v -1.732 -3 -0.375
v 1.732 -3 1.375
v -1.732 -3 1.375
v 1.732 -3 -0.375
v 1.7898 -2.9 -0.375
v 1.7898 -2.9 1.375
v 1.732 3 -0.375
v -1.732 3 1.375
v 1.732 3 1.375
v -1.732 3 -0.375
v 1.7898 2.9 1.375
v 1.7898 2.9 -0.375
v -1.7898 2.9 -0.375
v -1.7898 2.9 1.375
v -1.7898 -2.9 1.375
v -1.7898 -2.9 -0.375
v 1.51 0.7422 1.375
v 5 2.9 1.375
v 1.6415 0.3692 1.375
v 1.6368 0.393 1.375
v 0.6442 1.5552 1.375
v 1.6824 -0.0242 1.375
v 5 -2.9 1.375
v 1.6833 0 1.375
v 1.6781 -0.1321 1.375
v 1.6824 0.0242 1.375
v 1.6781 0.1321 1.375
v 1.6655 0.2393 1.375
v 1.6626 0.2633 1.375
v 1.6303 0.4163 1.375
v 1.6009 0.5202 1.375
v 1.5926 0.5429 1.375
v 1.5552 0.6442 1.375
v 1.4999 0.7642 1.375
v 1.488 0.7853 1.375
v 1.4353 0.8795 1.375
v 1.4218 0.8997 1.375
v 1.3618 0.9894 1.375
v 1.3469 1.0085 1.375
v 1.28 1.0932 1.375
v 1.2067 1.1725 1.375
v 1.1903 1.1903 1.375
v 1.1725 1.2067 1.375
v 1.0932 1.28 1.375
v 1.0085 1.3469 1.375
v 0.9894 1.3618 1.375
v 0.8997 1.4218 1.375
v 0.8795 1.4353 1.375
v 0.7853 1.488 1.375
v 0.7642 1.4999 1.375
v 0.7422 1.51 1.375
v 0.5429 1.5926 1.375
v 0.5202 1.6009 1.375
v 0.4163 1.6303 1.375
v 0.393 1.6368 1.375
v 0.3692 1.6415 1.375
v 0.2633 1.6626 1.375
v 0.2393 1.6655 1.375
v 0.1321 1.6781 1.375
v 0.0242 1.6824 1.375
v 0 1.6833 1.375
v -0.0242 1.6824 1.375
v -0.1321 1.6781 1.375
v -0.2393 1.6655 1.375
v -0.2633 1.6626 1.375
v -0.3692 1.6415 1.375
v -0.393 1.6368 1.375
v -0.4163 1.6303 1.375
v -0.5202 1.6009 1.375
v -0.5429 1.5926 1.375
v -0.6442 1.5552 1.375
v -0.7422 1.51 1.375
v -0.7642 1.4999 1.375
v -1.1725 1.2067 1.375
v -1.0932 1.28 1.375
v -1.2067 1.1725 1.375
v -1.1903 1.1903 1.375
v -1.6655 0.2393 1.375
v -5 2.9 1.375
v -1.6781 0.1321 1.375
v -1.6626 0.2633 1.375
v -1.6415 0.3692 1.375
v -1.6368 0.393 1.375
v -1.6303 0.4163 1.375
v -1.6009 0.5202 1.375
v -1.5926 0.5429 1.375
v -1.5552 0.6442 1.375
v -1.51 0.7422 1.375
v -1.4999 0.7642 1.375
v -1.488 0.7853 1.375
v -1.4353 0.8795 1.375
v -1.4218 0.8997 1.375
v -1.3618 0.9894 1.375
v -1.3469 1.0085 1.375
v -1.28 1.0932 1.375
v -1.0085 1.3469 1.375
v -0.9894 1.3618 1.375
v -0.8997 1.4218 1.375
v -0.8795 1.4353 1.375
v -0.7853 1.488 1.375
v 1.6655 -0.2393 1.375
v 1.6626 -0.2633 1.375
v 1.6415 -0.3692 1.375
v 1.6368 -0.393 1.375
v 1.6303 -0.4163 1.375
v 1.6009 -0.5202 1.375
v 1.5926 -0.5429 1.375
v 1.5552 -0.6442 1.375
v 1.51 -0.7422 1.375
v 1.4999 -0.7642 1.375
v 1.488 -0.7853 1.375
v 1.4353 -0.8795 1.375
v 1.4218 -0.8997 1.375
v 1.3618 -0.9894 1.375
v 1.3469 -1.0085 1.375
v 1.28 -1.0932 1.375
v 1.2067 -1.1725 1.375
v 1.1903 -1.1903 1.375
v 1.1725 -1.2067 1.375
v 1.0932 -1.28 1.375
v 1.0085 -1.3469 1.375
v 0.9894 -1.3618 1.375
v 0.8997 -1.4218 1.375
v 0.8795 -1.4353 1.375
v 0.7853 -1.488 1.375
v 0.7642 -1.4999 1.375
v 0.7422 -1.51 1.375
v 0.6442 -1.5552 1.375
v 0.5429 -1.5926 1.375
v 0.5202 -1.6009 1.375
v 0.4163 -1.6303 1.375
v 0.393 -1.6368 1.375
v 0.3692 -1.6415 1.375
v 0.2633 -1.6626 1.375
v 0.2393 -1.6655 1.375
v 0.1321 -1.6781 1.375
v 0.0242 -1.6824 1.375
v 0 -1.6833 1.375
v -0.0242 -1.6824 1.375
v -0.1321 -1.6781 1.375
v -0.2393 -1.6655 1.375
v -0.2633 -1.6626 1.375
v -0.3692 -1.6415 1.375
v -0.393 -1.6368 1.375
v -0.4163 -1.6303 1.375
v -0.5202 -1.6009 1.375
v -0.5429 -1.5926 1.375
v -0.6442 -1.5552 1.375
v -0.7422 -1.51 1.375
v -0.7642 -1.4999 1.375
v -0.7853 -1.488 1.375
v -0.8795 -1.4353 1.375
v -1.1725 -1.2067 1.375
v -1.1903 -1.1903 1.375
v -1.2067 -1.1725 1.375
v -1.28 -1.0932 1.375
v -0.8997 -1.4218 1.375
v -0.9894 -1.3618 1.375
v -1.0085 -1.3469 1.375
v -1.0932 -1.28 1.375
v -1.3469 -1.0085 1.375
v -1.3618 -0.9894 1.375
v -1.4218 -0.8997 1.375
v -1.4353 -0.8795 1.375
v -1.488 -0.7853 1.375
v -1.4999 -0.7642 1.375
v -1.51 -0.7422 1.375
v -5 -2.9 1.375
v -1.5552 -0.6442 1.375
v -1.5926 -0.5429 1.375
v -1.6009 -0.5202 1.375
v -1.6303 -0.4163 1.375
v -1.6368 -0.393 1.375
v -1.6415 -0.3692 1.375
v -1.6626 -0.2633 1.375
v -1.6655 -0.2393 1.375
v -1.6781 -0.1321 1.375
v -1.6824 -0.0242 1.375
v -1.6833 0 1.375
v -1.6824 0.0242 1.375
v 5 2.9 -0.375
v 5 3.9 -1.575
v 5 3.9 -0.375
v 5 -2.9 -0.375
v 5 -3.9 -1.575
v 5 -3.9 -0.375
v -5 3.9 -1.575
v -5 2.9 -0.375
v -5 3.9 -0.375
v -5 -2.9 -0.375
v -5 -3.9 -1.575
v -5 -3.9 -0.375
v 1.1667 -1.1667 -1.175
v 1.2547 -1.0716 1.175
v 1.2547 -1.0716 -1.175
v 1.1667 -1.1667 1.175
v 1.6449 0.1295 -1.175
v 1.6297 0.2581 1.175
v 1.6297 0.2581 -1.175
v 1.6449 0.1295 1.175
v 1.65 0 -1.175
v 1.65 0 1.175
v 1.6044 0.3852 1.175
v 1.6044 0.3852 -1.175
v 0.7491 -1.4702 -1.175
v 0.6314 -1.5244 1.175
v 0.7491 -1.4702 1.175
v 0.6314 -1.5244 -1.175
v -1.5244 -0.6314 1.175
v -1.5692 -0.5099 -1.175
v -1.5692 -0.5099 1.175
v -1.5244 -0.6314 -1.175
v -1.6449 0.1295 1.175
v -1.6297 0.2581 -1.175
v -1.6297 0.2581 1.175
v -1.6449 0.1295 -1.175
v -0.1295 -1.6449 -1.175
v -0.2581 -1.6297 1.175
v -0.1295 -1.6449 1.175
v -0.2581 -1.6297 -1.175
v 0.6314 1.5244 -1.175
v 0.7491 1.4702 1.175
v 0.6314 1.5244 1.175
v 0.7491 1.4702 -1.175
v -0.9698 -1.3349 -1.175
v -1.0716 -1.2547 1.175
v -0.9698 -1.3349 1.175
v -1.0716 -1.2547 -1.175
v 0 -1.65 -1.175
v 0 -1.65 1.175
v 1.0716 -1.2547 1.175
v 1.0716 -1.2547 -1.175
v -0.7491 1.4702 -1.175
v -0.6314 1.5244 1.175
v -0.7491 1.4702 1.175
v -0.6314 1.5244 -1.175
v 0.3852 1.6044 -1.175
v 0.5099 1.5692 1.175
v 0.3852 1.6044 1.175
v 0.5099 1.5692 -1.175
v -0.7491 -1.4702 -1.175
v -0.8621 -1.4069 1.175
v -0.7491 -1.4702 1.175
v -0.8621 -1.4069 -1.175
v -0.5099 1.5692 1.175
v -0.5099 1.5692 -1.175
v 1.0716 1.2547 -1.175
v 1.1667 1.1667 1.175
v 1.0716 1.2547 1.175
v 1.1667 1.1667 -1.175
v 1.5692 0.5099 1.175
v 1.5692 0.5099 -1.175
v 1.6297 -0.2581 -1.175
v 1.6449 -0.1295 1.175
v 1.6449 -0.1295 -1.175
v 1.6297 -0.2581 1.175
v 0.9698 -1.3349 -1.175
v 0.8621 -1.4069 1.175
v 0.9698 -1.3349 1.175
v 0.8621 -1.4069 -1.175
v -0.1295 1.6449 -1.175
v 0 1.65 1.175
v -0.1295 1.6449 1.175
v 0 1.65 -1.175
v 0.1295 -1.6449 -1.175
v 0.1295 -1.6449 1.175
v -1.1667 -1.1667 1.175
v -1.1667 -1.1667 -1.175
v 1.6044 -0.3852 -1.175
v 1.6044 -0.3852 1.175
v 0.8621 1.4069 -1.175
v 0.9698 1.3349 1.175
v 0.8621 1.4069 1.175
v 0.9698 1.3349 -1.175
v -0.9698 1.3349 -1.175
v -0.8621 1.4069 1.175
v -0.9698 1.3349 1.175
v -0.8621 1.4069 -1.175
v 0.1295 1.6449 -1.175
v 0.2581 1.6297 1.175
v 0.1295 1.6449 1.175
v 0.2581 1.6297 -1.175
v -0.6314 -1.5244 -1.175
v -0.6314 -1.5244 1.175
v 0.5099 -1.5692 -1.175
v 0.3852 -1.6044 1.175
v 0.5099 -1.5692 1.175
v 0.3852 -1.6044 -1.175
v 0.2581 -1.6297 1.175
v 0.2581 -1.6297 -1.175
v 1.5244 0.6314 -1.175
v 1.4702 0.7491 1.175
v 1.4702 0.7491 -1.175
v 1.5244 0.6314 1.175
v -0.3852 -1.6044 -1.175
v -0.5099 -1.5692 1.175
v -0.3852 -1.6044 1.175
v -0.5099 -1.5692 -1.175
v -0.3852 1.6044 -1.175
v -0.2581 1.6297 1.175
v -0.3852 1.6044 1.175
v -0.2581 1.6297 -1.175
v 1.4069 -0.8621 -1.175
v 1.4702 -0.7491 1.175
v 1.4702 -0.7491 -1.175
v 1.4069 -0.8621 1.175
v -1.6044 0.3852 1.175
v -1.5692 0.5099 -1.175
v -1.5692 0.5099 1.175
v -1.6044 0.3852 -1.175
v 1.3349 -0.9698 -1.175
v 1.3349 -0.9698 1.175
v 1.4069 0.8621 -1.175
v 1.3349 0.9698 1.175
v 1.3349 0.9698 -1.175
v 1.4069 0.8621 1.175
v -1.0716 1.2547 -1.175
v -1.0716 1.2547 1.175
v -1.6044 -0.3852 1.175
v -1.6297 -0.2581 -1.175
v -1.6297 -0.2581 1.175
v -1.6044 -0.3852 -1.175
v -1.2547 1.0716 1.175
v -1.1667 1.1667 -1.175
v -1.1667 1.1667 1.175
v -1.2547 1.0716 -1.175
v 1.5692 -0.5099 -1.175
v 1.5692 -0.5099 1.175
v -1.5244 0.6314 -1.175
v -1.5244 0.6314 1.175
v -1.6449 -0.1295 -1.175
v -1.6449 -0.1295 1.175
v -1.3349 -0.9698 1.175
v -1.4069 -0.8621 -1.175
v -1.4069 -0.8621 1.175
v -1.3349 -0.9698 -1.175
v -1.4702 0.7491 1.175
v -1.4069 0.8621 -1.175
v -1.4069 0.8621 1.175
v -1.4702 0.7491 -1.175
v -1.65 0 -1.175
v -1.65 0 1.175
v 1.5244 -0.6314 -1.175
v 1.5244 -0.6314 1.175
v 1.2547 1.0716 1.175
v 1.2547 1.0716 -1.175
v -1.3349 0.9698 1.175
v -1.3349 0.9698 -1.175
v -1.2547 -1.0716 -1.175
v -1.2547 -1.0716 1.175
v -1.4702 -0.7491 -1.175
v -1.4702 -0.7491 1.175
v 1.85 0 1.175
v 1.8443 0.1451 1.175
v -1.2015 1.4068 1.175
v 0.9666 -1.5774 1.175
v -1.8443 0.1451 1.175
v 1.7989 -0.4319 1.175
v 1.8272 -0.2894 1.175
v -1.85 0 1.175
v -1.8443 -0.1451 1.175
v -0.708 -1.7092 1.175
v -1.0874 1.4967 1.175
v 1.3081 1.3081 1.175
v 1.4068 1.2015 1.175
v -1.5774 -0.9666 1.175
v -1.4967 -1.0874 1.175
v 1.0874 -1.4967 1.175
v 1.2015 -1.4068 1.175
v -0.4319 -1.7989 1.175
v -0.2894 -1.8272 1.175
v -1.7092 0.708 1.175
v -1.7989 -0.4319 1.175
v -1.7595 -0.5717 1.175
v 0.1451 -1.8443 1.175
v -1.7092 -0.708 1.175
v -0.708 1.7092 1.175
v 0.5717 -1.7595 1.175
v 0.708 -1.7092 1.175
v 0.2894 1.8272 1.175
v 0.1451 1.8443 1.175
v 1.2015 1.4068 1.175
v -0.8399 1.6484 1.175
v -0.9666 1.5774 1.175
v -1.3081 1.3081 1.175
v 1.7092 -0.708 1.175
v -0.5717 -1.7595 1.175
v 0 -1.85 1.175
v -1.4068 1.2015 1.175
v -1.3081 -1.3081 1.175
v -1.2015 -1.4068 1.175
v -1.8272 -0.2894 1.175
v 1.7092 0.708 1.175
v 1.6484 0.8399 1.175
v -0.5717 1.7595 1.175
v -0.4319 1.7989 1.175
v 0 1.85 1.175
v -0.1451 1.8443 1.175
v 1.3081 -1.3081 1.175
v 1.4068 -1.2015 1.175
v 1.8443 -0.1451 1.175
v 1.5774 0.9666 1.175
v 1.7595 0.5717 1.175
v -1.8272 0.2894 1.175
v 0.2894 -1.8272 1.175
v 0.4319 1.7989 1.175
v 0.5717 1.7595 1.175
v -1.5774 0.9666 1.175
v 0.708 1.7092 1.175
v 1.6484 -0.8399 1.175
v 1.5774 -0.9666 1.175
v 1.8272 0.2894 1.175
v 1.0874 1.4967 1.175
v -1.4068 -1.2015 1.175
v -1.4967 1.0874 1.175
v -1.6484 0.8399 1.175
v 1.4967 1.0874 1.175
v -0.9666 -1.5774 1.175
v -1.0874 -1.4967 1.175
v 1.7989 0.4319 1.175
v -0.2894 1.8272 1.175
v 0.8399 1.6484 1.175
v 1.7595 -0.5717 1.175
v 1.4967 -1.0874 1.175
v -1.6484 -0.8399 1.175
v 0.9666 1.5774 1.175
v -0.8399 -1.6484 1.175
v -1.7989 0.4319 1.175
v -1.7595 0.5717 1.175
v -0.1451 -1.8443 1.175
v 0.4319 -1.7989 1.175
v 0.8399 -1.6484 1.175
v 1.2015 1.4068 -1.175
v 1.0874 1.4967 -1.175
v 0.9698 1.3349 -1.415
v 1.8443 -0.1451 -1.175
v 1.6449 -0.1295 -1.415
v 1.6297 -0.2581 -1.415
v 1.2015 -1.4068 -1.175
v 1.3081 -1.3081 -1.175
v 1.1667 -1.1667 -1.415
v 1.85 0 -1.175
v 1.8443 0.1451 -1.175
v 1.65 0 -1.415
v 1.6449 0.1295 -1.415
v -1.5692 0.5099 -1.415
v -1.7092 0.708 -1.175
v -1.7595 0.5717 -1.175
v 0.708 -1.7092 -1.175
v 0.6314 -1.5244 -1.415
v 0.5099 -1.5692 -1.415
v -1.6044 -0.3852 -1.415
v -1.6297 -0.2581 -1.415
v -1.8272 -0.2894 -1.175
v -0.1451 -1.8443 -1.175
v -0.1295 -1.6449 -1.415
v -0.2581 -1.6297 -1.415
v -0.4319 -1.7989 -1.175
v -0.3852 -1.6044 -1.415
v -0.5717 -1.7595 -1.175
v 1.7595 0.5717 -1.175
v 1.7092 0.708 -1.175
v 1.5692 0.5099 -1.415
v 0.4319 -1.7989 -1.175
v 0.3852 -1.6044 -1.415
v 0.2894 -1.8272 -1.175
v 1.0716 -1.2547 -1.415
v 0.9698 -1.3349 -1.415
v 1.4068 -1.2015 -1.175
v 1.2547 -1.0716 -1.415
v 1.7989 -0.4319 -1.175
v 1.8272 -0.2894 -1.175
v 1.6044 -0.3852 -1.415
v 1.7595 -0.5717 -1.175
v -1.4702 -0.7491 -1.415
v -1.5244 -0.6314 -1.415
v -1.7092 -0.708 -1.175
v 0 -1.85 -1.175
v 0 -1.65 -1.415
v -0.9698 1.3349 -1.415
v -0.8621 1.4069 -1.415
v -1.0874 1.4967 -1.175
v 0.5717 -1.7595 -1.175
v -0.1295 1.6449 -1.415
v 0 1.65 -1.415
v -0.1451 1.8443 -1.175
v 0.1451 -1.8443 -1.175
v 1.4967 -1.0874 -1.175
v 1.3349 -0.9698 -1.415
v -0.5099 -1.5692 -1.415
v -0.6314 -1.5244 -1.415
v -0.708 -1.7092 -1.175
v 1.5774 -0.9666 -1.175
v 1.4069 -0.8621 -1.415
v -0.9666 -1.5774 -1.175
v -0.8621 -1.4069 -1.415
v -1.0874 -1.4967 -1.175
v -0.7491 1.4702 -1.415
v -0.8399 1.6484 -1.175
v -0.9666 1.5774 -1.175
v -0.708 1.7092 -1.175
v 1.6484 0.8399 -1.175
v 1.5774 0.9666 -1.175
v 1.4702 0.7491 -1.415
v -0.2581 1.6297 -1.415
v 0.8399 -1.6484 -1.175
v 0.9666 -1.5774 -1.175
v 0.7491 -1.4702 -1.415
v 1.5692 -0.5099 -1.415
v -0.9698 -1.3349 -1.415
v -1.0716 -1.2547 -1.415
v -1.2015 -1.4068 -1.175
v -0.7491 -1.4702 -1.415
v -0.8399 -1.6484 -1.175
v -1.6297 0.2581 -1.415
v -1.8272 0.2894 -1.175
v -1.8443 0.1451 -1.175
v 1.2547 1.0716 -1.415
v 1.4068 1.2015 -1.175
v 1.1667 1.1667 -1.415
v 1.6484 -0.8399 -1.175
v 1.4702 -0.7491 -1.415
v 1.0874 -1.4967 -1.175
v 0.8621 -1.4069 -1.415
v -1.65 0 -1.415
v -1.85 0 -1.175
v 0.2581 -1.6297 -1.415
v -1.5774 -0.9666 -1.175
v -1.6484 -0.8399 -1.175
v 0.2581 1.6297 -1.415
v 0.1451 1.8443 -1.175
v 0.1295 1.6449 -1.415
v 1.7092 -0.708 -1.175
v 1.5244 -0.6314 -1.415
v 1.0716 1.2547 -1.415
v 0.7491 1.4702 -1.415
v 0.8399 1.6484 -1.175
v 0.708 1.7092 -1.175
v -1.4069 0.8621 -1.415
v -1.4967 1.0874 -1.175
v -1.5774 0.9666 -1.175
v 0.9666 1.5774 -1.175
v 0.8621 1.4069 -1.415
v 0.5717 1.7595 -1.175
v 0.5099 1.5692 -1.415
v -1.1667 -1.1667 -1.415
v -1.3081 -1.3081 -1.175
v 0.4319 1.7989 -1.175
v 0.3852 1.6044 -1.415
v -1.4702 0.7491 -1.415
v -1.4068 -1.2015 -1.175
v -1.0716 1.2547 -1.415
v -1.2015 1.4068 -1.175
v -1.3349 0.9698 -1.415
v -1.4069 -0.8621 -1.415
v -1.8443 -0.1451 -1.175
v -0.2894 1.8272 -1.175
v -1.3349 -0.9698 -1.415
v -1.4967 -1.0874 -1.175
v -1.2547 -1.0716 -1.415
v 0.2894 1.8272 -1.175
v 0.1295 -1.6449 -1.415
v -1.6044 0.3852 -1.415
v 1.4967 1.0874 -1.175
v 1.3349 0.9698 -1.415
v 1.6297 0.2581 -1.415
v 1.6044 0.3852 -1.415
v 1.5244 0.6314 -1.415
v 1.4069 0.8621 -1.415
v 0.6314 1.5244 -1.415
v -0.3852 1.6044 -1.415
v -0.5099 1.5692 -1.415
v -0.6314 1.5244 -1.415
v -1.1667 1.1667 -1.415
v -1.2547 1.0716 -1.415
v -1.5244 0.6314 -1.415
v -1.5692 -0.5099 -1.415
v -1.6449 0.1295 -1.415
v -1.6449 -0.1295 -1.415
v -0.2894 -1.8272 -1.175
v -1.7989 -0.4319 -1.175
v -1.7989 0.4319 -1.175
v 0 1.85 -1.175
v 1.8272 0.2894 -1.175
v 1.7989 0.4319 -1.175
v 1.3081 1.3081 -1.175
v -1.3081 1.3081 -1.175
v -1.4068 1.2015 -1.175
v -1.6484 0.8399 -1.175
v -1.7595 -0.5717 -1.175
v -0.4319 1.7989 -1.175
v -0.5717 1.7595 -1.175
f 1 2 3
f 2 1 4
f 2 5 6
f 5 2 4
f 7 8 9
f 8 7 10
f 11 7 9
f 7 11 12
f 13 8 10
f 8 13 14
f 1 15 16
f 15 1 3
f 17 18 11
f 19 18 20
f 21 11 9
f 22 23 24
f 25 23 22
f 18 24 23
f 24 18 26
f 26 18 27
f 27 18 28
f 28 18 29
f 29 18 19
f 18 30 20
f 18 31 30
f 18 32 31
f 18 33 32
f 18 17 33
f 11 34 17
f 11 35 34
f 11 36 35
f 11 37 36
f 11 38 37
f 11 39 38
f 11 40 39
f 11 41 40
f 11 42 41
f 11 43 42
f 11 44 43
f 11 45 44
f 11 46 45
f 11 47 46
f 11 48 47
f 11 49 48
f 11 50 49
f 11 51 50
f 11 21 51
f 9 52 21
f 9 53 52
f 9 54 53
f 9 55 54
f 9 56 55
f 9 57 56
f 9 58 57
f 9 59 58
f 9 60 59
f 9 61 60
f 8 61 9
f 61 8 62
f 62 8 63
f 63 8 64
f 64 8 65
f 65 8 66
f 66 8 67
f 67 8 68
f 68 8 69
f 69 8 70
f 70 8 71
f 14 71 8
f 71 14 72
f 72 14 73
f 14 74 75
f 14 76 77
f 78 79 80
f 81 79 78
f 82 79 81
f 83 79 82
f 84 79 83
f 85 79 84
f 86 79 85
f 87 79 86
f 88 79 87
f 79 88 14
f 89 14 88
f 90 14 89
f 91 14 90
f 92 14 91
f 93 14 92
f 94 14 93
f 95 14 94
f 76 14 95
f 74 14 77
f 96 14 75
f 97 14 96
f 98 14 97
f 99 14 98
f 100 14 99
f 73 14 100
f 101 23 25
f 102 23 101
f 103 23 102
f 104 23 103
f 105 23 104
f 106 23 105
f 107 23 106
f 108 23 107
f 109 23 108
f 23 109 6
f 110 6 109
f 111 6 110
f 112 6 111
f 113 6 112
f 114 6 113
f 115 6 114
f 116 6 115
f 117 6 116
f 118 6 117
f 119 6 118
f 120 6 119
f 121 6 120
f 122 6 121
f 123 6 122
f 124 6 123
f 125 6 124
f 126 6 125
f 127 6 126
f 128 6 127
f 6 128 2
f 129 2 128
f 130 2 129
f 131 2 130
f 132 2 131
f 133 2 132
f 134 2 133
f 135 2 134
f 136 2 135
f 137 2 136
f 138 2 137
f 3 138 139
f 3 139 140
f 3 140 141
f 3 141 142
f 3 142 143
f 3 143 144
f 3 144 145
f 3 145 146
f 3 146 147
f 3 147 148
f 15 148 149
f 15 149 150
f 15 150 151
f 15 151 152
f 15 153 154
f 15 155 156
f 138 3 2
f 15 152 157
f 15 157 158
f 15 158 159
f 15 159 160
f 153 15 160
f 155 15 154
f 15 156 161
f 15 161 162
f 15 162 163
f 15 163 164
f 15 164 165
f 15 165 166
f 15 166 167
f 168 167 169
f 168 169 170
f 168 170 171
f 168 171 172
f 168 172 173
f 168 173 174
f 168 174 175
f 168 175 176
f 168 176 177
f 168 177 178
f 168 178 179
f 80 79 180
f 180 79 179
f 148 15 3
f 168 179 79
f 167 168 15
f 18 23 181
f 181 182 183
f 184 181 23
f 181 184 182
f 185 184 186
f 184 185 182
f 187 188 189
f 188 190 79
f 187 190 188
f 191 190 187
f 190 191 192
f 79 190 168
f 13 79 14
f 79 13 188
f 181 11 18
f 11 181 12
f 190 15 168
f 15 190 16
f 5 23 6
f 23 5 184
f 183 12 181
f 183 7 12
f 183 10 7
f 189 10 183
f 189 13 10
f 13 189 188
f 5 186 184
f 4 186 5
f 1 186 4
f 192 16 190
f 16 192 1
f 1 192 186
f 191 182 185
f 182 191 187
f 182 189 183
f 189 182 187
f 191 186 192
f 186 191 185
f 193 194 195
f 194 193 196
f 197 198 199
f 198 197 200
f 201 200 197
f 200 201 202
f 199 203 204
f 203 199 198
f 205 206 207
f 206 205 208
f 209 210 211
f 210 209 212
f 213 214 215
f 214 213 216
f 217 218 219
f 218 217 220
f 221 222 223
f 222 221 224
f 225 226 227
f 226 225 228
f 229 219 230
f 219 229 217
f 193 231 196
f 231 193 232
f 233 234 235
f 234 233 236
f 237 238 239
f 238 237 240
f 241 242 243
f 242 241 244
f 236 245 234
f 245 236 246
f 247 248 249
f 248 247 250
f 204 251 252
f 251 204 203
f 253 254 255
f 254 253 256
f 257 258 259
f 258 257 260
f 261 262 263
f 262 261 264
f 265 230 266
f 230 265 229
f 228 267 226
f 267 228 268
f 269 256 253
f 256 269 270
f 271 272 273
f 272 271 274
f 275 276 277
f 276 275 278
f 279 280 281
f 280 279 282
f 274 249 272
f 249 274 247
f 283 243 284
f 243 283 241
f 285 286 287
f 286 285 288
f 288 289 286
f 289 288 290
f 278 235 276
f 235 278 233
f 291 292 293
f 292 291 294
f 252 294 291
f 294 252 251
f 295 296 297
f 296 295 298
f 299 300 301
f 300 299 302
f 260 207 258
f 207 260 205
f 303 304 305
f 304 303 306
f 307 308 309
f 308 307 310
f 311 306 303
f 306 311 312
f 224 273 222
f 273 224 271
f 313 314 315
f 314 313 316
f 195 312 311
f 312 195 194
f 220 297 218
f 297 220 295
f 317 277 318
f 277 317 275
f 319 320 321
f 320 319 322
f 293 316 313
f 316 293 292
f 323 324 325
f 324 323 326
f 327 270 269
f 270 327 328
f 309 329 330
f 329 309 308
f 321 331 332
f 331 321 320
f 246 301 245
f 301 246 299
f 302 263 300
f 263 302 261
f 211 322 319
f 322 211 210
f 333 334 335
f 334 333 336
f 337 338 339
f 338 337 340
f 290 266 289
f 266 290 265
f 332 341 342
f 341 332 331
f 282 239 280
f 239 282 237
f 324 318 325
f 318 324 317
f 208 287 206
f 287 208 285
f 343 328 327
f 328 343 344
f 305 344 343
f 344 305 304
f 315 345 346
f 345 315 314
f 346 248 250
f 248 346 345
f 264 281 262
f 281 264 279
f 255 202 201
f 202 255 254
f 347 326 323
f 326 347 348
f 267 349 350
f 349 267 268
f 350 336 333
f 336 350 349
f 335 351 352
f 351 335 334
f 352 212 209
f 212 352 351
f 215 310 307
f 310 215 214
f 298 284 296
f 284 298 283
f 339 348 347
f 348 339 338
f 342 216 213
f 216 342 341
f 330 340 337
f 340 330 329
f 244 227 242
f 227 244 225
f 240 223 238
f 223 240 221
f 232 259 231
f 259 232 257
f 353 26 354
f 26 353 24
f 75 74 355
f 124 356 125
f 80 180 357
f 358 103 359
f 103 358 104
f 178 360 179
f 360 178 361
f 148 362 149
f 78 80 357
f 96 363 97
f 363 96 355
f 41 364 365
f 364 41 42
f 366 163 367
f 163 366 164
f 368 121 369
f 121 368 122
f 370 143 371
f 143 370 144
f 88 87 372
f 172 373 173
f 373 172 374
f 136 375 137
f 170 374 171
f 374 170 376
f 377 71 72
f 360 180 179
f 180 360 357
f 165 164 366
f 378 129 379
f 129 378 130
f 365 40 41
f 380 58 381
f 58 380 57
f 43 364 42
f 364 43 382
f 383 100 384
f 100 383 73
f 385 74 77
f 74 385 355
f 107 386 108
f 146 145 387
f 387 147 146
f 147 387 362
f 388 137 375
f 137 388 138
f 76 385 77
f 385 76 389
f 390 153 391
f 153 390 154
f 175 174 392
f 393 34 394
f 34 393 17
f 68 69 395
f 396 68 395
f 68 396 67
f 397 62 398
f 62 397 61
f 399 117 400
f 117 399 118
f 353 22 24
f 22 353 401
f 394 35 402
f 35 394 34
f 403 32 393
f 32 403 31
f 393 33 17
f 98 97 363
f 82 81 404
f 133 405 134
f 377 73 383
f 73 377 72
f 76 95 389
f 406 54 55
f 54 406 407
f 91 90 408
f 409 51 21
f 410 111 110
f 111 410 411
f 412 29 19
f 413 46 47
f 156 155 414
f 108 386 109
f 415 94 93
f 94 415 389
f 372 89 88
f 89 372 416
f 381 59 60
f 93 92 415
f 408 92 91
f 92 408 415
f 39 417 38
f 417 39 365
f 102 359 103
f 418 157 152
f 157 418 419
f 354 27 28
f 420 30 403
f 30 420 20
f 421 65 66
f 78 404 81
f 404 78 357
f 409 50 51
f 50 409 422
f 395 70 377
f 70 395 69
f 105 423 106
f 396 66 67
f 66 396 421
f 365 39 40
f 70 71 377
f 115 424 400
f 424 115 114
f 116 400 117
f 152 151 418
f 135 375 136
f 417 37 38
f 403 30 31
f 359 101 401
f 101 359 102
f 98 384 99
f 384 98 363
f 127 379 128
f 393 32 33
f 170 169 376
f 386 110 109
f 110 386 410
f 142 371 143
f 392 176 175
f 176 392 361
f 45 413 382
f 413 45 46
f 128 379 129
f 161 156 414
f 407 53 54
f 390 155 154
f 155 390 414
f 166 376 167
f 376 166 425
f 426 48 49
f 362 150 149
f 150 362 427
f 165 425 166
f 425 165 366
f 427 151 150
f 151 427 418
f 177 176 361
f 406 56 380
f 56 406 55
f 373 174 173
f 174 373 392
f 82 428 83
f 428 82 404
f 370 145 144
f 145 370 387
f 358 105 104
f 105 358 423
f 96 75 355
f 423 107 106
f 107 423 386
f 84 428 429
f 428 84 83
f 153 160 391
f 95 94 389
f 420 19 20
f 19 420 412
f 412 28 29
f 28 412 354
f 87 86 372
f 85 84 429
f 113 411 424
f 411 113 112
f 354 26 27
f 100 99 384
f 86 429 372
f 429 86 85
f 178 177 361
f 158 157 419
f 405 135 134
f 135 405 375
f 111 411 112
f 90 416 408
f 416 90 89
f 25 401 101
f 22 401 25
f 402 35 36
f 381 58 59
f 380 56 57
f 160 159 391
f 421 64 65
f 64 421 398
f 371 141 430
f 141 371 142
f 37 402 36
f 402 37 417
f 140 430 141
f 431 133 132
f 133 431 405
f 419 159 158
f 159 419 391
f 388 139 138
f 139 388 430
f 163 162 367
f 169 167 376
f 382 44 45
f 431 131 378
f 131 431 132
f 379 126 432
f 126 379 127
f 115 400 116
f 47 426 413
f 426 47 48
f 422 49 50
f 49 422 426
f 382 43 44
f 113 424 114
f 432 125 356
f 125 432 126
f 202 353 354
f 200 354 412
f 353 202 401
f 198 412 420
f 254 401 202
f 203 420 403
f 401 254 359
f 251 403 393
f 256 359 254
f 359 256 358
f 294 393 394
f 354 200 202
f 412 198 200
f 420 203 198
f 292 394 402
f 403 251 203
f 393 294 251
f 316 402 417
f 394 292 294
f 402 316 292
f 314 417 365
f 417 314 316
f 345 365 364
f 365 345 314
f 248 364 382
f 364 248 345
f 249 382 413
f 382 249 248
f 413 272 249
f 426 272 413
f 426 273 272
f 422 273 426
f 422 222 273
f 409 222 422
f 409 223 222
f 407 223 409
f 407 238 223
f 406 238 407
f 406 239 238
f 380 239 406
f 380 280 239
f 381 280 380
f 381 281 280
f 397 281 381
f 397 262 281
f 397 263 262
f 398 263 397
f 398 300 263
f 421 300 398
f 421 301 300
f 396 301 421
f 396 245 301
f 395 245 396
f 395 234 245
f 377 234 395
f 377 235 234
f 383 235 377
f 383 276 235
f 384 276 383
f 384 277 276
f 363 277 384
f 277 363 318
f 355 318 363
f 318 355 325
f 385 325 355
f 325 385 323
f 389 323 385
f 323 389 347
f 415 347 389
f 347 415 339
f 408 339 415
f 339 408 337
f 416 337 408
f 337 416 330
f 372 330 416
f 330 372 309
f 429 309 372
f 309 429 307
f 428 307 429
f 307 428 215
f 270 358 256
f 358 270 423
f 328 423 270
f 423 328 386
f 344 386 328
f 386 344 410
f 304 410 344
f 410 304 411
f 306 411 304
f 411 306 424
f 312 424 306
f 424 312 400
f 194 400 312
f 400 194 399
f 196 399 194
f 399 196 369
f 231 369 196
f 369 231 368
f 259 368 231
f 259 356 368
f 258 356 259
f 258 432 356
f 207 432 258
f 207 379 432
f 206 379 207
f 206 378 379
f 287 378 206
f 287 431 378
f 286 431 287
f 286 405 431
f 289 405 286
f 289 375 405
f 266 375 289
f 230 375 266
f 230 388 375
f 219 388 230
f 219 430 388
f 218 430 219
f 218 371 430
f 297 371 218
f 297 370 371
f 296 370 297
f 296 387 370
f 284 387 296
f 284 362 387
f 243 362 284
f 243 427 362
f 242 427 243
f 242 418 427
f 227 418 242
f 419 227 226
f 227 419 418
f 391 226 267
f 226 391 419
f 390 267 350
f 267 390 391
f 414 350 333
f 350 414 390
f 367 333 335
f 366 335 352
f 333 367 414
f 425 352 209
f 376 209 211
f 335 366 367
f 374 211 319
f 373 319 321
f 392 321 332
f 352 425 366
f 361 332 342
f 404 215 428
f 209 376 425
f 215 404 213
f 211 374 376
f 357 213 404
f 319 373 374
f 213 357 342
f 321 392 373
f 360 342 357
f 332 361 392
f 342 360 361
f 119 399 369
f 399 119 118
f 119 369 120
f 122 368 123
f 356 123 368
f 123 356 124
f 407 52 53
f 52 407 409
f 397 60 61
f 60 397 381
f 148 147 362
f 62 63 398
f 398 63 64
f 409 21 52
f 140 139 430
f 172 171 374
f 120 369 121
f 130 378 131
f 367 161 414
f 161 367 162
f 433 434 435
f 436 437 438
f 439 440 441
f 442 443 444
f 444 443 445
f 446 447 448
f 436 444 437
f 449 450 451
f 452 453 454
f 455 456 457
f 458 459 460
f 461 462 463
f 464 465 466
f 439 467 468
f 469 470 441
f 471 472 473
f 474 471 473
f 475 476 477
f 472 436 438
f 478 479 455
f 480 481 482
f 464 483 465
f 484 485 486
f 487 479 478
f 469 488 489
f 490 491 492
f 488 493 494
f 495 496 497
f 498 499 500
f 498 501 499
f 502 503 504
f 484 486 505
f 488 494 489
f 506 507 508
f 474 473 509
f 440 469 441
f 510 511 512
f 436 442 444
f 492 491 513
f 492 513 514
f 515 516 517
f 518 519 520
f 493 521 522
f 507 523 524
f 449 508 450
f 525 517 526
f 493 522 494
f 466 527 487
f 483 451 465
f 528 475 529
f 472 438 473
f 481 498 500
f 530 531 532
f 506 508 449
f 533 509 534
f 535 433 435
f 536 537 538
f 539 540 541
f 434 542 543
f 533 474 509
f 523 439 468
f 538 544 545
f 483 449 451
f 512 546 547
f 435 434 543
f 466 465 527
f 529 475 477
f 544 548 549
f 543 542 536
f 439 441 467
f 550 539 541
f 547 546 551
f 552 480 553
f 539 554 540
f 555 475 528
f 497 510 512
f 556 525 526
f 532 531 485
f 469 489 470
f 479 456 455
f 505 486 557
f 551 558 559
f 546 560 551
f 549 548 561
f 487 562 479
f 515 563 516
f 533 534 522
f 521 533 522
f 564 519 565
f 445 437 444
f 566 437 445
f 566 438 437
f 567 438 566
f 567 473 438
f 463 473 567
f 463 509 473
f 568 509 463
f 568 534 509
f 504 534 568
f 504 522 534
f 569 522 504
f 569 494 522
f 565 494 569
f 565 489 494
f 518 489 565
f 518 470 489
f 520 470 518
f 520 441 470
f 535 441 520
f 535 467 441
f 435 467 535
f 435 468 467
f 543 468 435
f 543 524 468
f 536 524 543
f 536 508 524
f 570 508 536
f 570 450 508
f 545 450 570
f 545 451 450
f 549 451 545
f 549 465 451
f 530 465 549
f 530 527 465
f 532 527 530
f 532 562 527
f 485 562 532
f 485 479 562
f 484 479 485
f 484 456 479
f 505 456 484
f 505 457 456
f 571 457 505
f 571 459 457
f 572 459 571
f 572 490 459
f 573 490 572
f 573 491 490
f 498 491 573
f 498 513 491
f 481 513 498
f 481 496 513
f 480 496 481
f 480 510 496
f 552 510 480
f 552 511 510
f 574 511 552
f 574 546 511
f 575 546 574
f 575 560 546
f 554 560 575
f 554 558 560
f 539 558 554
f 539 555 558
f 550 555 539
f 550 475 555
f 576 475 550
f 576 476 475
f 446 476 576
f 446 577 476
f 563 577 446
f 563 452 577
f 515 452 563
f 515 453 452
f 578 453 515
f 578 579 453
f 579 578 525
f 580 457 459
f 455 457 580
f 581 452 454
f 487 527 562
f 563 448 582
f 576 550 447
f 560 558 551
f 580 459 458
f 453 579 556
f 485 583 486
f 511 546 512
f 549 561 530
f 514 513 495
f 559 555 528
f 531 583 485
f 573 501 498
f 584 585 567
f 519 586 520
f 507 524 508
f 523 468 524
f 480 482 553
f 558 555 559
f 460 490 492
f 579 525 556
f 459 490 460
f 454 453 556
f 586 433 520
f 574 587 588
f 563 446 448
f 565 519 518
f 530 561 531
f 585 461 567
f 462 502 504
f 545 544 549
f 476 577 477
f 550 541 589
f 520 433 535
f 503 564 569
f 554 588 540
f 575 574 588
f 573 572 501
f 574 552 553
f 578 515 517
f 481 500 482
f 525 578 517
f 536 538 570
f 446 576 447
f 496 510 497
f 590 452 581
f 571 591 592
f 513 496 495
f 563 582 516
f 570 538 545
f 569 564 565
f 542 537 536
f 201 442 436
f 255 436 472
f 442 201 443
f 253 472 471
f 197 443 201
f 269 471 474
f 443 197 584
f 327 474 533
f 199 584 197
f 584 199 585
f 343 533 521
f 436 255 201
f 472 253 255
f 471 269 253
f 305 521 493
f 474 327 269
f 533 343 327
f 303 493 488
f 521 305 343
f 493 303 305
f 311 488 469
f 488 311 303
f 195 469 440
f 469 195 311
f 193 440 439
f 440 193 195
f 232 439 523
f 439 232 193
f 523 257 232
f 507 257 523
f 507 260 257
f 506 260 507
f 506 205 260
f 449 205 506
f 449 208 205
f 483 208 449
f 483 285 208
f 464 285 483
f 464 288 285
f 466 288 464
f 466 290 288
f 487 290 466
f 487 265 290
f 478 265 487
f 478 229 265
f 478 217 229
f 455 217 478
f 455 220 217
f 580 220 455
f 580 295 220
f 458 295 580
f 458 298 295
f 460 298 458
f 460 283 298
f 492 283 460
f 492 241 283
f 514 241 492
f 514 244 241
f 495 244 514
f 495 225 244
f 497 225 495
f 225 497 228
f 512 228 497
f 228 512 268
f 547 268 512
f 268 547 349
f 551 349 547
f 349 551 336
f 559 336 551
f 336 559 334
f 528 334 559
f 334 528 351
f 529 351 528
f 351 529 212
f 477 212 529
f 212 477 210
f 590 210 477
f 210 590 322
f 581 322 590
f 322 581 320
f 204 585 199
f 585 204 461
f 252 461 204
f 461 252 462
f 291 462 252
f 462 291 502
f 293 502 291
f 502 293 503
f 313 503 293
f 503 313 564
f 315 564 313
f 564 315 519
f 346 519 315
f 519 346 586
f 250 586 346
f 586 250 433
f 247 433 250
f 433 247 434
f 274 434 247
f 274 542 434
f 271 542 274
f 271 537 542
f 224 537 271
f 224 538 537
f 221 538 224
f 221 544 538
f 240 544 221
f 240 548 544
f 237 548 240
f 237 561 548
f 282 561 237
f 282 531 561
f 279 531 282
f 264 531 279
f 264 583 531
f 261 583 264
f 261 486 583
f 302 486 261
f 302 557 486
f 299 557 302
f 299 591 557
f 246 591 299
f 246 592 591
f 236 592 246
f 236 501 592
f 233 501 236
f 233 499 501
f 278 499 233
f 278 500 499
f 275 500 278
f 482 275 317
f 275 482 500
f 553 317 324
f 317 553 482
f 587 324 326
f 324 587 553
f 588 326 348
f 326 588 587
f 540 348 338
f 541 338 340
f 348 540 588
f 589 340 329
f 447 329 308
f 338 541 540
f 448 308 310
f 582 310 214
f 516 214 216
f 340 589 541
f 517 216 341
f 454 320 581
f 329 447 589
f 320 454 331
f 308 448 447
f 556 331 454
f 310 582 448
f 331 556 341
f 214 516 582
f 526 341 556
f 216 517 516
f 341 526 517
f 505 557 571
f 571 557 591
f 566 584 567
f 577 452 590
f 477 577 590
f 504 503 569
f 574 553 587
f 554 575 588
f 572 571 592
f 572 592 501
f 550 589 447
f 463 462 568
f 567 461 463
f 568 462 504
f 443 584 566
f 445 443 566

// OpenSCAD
// T-slot nut for M3 screw, 6.0mm across flats, 2.75mm thick
// One connected solid (nut body only), with a centered M3 clearance hole.

$fn = 80;

// Parameters (mm)
screw_diameter_mm        = 3.0;
hole_clearance_mm        = 0.30;   // clearance for M3
outer_across_flats_mm    = 6.0;    // hex across flats
thickness_mm             = 2.75;   // overall thickness
chamfer_mm               = 0.20;   // small lead-in on both faces
eps_mm                   = 0.02;

// Simple T-slot slider features (kept connected and within thickness)
retention_length_mm      = 10.0;   // along X
neck_width_mm            = 5.8;    // narrow section width (Y)
retention_width_mm       = 7.8;    // wider step width (Y)
retention_step_height_mm = 1.20;   // step height (Z)
overlap_mm               = 0.20;   // overlap to guarantee manifold unions

function hex_circumradius_from_af(af) = af / (2 * cos(30)); // R such that across-flats = af

module tslot_nut() {
    R_hex = hex_circumradius_from_af(outer_across_flats_mm);
    hole_r = (screw_diameter_mm + hole_clearance_mm) / 2;

    difference() {
        // ONE connected solid: hex nut + retention slider profile
        union() {
            // Hex body
            cylinder(r=R_hex, h=thickness_mm, center=true, $fn=6);

            // Neck block (centered, same thickness)
            cube([retention_length_mm, neck_width_mm, thickness_mm], center=true);

            // Wider retention step on the bottom face (connected by overlap)
            translate([0, 0, -thickness_mm/2 + retention_step_height_mm/2 - overlap_mm])
                cube([retention_length_mm, retention_width_mm, retention_step_height_mm], center=true);
        }

        // Central through-hole for M3
        cylinder(r=hole_r, h=thickness_mm + 2*eps_mm, center=true);

        // Lead-in chamfers (top and bottom) around the hole
        translate([0, 0,  thickness_mm/2 - chamfer_mm/2 + eps_mm])
            cylinder(r1=hole_r + chamfer_mm, r2=hole_r, h=chamfer_mm + 2*eps_mm, center=true);

        translate([0, 0, -thickness_mm/2 + chamfer_mm/2 - eps_mm])
            cylinder(r1=hole_r, r2=hole_r + chamfer_mm, h=chamfer_mm + 2*eps_mm, center=true);
    }
}

tslot_nut();
